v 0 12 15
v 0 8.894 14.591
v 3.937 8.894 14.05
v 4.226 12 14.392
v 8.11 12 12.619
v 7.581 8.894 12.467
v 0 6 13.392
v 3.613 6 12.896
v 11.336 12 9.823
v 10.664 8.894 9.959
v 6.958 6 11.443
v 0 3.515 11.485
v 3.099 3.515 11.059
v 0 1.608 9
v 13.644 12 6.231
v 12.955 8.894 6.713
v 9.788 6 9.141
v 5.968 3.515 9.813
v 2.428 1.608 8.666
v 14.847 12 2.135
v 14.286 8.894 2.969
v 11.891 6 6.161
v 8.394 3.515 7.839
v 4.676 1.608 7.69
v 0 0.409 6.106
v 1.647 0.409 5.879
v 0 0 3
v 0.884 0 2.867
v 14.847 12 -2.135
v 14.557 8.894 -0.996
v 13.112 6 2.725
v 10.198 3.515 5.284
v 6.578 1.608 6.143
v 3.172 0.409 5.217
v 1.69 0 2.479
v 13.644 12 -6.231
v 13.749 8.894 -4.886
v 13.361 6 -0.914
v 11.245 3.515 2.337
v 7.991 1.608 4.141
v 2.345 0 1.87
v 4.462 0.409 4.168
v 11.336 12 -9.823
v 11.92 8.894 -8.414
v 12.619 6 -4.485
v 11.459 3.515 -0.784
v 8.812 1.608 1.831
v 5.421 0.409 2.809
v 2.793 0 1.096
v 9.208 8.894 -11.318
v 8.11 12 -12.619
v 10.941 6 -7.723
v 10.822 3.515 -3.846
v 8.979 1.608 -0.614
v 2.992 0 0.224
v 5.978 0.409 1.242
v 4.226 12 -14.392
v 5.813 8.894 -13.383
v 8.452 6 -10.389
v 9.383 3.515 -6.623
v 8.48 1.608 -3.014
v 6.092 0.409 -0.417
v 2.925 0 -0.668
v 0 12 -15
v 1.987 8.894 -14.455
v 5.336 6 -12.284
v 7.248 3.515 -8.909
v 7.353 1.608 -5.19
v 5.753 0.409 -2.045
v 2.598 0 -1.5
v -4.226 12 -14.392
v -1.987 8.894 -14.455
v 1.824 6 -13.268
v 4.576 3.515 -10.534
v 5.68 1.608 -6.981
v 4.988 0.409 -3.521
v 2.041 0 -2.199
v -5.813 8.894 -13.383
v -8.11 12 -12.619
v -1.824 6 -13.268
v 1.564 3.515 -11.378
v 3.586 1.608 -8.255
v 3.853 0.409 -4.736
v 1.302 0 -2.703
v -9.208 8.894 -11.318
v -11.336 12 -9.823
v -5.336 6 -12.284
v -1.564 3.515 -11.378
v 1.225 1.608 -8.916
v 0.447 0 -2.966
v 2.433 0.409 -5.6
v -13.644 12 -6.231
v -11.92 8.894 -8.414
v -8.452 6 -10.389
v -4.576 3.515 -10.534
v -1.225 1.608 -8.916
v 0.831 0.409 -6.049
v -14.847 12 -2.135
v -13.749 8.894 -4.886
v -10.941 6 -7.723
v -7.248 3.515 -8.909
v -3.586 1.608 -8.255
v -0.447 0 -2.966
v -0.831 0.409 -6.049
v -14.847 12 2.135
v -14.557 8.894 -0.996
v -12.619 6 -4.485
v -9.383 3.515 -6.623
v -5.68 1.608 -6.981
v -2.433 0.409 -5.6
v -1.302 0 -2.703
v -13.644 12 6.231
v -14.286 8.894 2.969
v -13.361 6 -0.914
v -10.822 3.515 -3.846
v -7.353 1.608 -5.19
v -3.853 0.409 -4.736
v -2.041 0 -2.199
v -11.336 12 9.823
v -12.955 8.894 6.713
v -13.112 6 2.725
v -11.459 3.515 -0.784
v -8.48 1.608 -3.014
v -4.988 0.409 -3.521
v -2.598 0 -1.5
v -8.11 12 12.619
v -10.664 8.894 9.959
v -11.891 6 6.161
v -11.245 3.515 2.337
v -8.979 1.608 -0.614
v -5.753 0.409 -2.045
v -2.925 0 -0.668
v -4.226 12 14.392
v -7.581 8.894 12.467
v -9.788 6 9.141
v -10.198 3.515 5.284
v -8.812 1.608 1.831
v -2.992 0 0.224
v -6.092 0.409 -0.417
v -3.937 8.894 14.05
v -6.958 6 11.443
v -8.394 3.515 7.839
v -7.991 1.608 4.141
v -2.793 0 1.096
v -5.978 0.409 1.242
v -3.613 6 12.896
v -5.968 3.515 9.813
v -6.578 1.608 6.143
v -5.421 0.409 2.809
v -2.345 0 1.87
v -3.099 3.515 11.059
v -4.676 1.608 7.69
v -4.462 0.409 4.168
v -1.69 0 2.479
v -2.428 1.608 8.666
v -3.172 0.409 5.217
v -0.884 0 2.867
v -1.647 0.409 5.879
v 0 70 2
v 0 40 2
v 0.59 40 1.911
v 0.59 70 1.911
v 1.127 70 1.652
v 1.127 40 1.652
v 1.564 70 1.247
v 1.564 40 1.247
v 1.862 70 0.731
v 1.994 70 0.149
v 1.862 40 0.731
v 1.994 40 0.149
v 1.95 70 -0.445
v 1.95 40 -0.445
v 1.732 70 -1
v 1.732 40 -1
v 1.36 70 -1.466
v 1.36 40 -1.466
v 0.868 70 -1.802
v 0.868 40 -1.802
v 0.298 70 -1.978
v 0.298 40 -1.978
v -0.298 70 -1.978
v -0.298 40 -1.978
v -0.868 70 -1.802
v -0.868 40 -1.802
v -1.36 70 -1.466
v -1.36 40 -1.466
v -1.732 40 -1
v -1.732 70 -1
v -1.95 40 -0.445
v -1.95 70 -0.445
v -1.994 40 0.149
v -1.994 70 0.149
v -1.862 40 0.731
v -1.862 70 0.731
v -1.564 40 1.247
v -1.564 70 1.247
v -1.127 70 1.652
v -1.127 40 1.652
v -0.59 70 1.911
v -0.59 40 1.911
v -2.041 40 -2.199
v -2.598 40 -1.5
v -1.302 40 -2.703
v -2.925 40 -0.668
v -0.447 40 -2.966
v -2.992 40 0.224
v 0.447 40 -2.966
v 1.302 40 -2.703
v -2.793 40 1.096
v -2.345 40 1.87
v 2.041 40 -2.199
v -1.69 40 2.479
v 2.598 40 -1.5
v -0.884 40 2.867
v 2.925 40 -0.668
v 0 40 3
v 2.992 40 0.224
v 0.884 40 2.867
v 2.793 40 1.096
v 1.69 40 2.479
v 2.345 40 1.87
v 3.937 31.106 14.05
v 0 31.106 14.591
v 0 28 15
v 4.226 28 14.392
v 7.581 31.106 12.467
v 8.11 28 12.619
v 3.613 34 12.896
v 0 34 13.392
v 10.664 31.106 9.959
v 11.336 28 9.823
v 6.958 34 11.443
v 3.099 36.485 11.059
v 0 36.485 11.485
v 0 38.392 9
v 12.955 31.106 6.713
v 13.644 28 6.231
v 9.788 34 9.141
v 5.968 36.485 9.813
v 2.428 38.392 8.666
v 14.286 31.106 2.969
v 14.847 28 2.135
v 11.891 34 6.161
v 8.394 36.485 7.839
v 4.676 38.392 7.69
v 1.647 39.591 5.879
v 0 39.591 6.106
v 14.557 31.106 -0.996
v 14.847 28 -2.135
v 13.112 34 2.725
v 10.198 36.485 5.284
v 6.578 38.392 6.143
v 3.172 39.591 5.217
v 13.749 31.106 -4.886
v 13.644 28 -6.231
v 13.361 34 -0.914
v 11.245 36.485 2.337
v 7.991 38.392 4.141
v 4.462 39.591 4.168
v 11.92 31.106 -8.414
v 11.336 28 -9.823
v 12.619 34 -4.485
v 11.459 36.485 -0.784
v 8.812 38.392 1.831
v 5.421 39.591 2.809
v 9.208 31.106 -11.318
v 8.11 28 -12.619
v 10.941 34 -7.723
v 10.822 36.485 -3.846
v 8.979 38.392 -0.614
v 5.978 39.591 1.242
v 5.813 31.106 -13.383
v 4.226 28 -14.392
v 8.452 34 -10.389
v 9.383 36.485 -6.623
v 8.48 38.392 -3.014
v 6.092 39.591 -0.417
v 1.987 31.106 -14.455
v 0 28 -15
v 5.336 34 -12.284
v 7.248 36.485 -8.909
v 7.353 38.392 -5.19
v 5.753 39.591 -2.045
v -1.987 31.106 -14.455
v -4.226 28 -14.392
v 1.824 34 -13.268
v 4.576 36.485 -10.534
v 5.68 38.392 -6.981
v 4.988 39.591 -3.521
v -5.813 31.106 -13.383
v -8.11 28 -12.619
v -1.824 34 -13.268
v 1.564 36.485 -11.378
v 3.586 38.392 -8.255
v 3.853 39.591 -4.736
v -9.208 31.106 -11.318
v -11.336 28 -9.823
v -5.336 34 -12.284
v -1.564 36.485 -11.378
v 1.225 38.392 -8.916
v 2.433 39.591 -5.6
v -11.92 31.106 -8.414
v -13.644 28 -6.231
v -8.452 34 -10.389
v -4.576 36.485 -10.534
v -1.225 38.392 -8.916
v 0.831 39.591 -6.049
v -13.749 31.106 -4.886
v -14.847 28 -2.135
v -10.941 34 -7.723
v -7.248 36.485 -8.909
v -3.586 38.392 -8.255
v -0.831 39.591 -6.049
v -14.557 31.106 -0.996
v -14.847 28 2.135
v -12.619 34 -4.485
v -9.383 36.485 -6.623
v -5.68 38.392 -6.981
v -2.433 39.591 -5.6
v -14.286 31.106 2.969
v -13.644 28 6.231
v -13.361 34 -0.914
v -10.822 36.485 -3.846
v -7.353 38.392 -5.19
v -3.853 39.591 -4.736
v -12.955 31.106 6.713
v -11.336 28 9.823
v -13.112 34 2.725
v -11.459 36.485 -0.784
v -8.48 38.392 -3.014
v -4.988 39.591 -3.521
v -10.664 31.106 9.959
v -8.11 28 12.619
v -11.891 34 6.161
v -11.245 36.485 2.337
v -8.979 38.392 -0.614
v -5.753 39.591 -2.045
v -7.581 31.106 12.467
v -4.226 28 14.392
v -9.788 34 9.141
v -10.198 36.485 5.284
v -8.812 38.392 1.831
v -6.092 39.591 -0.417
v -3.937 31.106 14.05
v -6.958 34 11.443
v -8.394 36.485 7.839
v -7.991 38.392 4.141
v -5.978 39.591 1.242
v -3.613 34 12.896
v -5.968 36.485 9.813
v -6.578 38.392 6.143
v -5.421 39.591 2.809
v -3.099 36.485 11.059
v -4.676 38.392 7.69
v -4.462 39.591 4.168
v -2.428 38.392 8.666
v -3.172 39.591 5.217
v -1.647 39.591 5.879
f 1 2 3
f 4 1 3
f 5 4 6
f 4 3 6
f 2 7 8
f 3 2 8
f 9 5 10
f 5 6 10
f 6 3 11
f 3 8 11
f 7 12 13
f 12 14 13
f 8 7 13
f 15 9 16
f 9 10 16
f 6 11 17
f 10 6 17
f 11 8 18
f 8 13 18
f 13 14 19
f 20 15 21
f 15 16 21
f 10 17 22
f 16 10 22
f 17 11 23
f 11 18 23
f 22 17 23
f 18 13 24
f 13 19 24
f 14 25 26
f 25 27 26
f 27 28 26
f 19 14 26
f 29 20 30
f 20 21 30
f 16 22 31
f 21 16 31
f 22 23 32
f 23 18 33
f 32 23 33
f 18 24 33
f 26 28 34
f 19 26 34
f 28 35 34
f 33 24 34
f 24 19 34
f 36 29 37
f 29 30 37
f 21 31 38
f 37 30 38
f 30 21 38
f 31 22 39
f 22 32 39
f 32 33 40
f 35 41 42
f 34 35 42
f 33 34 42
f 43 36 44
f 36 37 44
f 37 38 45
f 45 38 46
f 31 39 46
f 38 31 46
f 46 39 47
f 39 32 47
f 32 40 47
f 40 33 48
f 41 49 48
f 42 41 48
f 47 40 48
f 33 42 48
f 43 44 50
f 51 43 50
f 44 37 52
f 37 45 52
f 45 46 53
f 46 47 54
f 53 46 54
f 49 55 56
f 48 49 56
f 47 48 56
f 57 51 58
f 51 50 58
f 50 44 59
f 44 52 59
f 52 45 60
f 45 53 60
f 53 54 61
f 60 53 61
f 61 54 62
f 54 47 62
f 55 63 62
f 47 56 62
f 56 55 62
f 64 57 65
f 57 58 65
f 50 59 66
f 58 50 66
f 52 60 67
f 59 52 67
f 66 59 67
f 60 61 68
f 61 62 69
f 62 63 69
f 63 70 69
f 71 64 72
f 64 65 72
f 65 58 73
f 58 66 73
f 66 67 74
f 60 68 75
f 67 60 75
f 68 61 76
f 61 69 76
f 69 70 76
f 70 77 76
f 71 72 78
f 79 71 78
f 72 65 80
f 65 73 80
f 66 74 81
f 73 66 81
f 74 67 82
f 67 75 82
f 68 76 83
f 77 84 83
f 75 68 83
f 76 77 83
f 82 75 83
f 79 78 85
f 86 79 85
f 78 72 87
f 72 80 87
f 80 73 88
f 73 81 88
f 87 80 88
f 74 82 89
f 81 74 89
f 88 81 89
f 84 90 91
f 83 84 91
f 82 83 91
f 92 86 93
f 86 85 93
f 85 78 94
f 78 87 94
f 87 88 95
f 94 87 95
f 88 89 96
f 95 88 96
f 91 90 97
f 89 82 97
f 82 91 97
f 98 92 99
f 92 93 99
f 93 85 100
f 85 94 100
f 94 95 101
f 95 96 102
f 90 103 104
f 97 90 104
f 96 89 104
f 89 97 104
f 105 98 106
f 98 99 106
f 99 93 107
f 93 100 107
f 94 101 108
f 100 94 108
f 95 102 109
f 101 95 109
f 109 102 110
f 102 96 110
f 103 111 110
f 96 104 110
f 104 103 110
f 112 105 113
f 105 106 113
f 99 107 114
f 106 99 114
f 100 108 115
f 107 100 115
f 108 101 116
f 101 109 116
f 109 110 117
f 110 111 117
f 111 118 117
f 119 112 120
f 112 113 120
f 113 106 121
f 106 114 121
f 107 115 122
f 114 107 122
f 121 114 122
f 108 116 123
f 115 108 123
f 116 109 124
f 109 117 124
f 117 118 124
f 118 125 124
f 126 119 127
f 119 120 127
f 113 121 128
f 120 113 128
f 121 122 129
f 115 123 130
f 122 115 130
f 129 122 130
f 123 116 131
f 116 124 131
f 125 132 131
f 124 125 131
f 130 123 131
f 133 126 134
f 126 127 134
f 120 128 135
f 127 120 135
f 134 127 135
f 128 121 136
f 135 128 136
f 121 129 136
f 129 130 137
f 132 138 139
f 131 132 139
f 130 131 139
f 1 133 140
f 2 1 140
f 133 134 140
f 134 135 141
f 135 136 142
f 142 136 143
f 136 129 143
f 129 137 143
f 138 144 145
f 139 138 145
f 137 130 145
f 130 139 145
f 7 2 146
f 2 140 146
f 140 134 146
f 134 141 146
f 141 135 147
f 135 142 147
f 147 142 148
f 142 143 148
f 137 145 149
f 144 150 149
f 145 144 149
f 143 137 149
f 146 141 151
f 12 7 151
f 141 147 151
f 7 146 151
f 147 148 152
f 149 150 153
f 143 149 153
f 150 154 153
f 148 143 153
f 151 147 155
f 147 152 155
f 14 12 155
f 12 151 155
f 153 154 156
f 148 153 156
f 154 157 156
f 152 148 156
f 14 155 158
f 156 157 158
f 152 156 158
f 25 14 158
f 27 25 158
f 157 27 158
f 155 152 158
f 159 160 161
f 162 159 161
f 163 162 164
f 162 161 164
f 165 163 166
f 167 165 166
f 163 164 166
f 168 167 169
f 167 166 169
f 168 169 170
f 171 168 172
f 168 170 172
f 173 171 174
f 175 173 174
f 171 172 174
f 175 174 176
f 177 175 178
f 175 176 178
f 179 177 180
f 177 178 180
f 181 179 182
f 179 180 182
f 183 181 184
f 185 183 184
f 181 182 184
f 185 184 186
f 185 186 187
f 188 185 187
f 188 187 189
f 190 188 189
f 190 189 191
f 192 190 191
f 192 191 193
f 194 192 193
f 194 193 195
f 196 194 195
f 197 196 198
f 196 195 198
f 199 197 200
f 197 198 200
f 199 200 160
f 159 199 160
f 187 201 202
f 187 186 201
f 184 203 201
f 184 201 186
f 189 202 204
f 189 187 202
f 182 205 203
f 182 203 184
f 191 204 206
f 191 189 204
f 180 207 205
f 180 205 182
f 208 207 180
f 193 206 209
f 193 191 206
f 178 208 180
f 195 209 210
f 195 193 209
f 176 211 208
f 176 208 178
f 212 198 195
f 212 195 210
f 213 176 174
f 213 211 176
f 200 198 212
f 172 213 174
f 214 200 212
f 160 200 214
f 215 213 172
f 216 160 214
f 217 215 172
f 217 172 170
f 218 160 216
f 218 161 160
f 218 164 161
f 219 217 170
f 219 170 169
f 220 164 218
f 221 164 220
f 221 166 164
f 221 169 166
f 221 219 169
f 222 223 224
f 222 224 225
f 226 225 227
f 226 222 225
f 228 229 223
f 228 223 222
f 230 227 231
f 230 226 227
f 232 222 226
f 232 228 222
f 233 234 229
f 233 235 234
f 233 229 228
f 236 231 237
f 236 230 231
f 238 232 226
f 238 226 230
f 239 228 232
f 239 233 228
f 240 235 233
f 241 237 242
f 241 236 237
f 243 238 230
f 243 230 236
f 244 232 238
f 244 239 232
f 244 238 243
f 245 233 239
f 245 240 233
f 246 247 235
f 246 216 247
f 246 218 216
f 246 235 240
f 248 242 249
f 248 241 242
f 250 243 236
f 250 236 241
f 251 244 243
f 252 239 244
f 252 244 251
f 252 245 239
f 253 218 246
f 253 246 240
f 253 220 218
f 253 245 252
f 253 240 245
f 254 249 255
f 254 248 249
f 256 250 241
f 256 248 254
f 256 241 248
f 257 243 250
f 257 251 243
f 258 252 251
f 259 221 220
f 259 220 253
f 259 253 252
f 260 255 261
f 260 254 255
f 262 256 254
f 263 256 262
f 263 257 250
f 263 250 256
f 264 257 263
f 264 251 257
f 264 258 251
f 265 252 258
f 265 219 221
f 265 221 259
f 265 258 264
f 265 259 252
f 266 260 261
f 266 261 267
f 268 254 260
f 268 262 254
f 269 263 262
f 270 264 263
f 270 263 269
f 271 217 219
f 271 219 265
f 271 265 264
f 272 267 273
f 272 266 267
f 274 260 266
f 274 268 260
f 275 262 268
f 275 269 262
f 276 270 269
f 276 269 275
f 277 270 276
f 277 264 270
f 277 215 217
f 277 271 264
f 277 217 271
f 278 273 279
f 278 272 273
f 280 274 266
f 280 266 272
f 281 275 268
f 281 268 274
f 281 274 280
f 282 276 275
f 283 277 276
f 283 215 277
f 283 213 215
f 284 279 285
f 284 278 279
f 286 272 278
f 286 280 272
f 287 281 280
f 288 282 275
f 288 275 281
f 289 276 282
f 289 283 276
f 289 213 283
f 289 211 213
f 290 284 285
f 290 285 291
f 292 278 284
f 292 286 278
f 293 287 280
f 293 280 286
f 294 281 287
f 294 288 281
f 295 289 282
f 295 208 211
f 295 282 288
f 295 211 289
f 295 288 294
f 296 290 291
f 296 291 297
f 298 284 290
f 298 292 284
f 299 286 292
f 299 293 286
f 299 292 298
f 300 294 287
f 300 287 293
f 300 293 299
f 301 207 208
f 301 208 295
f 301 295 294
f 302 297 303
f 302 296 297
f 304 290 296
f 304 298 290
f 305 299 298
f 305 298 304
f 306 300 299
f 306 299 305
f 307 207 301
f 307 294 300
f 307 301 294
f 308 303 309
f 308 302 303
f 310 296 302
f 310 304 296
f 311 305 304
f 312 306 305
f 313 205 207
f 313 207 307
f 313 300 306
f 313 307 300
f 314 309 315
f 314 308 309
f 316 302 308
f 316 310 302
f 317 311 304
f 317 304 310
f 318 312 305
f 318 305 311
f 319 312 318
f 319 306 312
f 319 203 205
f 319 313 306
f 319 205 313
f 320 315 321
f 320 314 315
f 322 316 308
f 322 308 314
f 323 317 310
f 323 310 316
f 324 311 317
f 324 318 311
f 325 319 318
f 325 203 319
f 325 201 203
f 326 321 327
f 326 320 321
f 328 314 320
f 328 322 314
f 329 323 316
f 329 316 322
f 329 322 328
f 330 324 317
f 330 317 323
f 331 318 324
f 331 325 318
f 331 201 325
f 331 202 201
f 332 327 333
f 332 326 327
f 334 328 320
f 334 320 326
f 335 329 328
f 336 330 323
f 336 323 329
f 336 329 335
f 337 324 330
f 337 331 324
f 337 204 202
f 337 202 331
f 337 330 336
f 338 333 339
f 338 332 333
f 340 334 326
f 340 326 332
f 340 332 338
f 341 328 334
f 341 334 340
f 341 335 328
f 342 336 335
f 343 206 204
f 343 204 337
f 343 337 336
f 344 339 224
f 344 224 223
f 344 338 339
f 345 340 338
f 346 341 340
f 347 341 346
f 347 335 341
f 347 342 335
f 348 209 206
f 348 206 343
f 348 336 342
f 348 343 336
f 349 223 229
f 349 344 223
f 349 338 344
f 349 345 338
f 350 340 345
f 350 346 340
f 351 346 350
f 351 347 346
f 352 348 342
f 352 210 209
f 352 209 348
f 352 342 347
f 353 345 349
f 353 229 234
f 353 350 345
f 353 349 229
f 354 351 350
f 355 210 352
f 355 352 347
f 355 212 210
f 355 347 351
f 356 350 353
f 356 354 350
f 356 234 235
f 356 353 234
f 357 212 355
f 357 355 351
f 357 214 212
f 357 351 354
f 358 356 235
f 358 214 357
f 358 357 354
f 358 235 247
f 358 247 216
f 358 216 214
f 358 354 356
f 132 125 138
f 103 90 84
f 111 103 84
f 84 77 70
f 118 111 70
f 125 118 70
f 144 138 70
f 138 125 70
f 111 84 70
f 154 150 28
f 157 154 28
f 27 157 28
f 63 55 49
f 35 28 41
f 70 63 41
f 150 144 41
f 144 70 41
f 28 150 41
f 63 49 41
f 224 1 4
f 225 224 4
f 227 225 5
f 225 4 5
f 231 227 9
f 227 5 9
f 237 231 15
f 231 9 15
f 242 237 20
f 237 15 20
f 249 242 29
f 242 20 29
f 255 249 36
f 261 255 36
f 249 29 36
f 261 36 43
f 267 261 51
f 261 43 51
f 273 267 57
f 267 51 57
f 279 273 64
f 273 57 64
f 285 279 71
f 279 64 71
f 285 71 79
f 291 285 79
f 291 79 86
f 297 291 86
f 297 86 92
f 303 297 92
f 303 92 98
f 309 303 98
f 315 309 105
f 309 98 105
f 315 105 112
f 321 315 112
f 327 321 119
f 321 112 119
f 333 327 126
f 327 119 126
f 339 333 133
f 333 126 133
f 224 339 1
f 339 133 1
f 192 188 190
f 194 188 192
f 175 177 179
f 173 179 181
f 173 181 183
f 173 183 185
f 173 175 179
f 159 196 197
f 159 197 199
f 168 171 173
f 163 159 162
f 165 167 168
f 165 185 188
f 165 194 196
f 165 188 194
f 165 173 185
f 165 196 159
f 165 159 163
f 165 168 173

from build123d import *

# Parameters (mm, degrees)
SKETCH1_R           = 15
BOSS_EXTRUDE1_DEPTH = 40
FILLET1_R           = 12
SKETCH2_R           = 2
BOSS_EXTRUDE2_DEPTH = 30


with BuildPart() as part:
    # Sketch1 → Boss-Extrude1 (new body)
    with BuildSketch(Plane(origin=(0, 0, 0), x_dir=(1, 0, 0), z_dir=(0, 1, 0))):
        with Locations(Location((0, 0, 0), (0, 0, 270))):
            Circle(SKETCH1_R)
    extrude(amount=BOSS_EXTRUDE1_DEPTH)

    # Fillet1
    fillet1_edges = [part.edges().sort_by_distance(p)[0] for p in [
        (0, 0, -15),
        (0, 40, -15),
    ]]
    fillet(fillet1_edges, radius=FILLET1_R)

    # Sketch2 → Boss-Extrude2 (add)
    with BuildSketch(Plane(origin=(0, 40, 0), x_dir=(1, 0, 0), z_dir=(0, 1, 0))):
        with Locations(Location((0, 0, 0), (0, 0, 270))):
            Circle(SKETCH2_R)
    extrude(amount=BOSS_EXTRUDE2_DEPTH)


solid = part.part
